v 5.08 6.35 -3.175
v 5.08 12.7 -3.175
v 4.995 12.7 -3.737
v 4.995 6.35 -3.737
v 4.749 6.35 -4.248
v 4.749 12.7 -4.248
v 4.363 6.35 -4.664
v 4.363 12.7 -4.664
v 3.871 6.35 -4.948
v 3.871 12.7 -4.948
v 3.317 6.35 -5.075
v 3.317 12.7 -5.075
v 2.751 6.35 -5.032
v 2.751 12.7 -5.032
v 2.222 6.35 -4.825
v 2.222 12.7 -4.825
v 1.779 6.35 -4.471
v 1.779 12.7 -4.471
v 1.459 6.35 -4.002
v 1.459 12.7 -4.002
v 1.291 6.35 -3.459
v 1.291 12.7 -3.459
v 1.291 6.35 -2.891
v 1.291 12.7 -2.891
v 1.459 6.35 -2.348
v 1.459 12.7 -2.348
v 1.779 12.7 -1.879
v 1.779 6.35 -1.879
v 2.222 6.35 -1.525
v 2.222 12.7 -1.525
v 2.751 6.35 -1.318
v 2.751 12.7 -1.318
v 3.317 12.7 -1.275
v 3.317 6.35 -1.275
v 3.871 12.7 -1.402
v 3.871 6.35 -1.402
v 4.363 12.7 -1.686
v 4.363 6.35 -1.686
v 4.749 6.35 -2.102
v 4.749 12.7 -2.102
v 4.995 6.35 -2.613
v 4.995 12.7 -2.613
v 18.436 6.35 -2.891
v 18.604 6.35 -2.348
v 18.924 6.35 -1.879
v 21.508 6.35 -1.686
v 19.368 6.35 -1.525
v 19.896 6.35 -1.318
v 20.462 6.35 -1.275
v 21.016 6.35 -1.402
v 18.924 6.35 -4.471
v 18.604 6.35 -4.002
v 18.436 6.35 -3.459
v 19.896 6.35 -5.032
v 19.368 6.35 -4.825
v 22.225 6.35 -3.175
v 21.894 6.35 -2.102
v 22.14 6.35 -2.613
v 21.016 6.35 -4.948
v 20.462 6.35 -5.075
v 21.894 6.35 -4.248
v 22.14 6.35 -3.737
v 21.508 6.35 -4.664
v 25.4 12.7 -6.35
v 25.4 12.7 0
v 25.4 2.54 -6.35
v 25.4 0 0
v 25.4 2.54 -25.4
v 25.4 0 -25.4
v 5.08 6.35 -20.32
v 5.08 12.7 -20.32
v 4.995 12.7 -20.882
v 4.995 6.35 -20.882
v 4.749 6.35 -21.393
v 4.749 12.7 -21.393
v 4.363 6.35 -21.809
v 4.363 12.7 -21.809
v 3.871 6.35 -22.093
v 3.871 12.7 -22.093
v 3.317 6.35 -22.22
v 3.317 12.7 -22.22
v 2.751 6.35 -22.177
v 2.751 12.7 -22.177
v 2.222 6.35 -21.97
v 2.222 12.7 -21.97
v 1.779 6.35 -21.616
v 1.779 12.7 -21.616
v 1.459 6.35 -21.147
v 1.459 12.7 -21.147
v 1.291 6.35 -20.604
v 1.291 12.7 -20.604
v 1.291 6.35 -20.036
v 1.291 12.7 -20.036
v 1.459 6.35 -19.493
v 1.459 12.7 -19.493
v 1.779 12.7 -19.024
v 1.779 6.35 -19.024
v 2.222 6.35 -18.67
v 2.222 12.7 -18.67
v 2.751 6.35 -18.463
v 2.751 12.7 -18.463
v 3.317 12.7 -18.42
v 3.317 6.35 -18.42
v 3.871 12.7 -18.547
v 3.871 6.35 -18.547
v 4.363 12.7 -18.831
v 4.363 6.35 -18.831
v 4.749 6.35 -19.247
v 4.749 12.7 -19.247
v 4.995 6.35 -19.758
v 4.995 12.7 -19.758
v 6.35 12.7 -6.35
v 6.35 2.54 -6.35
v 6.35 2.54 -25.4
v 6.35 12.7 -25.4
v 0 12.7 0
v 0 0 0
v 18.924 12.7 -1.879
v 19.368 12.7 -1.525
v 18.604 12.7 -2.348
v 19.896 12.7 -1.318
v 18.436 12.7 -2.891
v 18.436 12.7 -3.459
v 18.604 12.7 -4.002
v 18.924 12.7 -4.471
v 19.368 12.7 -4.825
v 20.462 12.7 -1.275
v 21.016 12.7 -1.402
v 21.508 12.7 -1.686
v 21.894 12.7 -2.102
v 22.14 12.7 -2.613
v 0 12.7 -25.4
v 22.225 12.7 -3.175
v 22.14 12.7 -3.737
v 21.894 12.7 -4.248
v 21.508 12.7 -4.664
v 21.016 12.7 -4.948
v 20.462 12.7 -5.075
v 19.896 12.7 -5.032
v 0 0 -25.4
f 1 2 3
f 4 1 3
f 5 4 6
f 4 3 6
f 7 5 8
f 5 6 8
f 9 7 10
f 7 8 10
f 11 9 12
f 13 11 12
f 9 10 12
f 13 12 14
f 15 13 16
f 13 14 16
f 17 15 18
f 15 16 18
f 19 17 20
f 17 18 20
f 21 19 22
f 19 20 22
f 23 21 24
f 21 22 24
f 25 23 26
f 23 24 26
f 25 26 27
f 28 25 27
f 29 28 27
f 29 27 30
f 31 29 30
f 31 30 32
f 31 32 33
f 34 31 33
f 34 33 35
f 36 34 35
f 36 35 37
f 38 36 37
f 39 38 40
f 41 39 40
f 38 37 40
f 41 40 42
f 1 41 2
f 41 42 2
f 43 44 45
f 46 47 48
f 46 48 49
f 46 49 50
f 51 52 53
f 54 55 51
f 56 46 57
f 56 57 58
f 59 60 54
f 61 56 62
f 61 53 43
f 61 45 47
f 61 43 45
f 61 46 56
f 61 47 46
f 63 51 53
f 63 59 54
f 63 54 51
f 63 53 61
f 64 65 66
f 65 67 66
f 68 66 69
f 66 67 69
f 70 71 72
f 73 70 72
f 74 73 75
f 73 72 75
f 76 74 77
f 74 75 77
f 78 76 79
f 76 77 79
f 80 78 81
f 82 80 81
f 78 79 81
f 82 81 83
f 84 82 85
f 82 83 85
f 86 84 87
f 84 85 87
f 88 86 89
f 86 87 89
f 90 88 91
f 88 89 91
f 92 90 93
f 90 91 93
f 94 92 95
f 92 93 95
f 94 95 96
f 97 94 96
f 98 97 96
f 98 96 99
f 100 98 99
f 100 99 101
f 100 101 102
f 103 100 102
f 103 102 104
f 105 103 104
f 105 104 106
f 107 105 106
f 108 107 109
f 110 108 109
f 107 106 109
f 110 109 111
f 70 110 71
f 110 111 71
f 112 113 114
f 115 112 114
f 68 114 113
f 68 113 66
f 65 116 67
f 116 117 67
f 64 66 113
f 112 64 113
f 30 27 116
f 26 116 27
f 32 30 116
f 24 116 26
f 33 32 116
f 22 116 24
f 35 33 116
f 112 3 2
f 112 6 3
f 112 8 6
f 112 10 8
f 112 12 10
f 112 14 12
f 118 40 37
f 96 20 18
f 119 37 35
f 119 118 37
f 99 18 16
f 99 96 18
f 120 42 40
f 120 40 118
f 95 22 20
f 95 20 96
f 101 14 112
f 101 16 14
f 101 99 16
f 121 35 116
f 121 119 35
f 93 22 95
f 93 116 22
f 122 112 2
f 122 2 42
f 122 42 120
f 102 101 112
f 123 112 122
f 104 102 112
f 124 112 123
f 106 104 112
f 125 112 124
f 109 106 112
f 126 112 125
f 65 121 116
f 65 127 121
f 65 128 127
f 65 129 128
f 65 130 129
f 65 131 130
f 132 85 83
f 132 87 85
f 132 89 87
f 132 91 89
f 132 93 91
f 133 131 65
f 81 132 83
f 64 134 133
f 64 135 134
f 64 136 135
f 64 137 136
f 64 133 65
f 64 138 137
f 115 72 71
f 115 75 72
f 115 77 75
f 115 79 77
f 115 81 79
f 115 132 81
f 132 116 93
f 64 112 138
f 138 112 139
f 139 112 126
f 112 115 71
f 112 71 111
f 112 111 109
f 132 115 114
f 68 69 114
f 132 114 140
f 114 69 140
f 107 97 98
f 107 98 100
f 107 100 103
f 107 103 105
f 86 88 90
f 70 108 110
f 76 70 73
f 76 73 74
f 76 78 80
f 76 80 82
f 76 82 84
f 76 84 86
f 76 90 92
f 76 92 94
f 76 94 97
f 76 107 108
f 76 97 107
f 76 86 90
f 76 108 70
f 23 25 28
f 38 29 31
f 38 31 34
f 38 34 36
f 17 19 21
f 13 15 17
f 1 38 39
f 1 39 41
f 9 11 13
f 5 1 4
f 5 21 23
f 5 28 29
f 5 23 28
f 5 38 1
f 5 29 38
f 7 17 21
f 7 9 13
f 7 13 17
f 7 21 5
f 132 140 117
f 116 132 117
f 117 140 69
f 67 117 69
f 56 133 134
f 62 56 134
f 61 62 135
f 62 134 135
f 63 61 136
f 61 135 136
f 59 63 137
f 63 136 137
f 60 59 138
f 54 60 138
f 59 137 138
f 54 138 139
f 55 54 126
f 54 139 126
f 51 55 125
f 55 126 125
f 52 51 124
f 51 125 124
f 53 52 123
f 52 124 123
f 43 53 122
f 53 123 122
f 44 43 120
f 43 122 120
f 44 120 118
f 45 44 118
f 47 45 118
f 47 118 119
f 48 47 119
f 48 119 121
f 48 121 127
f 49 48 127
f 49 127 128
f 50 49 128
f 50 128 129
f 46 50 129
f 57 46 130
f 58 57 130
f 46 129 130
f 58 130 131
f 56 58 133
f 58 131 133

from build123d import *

# Parameters (mm, degrees)
SKETCH1_W           = 25.4
SKETCH1_H           = 25.4
BOSS_EXTRUDE1_DEPTH = 2.54
BOSS_EXTRUDE2_DEPTH = 10.16
SKETCH3_R           = 1.905
CUT_EXTRUDE1_DEPTH  = 6.35


with BuildPart() as part:
    # Sketch1 → Boss-Extrude1 (new body)
    with BuildSketch(Plane(origin=(0, 0, 0), x_dir=(1, 0, 0), z_dir=(0, 1, 0))):
        with Locations((12.7, 12.7)):
            Rectangle(SKETCH1_W, SKETCH1_H)
    extrude(amount=BOSS_EXTRUDE1_DEPTH)

    # Sketch2 → Boss-Extrude2 (add)
    with BuildSketch(Plane(origin=(0, 2.54, 0), x_dir=(1, 0, 0), z_dir=(0, 1, 0))):
        Polygon((0, 25.4), (0, 0), (25.4, 0), (25.4, 6.35), (6.35, 6.35), (6.35, 25.4), align=None)
    extrude(amount=BOSS_EXTRUDE2_DEPTH)

    # Sketch3 → Cut-Extrude1 (cut)
    with BuildSketch(Plane(origin=(0, 12.7, 0), x_dir=(1, 0, 0), z_dir=(0, 1, 0))):
        with Locations((3.175, 20.32)):
            Circle(SKETCH3_R)
        with Locations((3.175, 3.175)):
            Circle(SKETCH3_R)
        with Locations((20.32, 3.175)):
            Circle(SKETCH3_R)
    extrude(amount=-CUT_EXTRUDE1_DEPTH, mode=Mode.SUBTRACT)


solid = part.part
